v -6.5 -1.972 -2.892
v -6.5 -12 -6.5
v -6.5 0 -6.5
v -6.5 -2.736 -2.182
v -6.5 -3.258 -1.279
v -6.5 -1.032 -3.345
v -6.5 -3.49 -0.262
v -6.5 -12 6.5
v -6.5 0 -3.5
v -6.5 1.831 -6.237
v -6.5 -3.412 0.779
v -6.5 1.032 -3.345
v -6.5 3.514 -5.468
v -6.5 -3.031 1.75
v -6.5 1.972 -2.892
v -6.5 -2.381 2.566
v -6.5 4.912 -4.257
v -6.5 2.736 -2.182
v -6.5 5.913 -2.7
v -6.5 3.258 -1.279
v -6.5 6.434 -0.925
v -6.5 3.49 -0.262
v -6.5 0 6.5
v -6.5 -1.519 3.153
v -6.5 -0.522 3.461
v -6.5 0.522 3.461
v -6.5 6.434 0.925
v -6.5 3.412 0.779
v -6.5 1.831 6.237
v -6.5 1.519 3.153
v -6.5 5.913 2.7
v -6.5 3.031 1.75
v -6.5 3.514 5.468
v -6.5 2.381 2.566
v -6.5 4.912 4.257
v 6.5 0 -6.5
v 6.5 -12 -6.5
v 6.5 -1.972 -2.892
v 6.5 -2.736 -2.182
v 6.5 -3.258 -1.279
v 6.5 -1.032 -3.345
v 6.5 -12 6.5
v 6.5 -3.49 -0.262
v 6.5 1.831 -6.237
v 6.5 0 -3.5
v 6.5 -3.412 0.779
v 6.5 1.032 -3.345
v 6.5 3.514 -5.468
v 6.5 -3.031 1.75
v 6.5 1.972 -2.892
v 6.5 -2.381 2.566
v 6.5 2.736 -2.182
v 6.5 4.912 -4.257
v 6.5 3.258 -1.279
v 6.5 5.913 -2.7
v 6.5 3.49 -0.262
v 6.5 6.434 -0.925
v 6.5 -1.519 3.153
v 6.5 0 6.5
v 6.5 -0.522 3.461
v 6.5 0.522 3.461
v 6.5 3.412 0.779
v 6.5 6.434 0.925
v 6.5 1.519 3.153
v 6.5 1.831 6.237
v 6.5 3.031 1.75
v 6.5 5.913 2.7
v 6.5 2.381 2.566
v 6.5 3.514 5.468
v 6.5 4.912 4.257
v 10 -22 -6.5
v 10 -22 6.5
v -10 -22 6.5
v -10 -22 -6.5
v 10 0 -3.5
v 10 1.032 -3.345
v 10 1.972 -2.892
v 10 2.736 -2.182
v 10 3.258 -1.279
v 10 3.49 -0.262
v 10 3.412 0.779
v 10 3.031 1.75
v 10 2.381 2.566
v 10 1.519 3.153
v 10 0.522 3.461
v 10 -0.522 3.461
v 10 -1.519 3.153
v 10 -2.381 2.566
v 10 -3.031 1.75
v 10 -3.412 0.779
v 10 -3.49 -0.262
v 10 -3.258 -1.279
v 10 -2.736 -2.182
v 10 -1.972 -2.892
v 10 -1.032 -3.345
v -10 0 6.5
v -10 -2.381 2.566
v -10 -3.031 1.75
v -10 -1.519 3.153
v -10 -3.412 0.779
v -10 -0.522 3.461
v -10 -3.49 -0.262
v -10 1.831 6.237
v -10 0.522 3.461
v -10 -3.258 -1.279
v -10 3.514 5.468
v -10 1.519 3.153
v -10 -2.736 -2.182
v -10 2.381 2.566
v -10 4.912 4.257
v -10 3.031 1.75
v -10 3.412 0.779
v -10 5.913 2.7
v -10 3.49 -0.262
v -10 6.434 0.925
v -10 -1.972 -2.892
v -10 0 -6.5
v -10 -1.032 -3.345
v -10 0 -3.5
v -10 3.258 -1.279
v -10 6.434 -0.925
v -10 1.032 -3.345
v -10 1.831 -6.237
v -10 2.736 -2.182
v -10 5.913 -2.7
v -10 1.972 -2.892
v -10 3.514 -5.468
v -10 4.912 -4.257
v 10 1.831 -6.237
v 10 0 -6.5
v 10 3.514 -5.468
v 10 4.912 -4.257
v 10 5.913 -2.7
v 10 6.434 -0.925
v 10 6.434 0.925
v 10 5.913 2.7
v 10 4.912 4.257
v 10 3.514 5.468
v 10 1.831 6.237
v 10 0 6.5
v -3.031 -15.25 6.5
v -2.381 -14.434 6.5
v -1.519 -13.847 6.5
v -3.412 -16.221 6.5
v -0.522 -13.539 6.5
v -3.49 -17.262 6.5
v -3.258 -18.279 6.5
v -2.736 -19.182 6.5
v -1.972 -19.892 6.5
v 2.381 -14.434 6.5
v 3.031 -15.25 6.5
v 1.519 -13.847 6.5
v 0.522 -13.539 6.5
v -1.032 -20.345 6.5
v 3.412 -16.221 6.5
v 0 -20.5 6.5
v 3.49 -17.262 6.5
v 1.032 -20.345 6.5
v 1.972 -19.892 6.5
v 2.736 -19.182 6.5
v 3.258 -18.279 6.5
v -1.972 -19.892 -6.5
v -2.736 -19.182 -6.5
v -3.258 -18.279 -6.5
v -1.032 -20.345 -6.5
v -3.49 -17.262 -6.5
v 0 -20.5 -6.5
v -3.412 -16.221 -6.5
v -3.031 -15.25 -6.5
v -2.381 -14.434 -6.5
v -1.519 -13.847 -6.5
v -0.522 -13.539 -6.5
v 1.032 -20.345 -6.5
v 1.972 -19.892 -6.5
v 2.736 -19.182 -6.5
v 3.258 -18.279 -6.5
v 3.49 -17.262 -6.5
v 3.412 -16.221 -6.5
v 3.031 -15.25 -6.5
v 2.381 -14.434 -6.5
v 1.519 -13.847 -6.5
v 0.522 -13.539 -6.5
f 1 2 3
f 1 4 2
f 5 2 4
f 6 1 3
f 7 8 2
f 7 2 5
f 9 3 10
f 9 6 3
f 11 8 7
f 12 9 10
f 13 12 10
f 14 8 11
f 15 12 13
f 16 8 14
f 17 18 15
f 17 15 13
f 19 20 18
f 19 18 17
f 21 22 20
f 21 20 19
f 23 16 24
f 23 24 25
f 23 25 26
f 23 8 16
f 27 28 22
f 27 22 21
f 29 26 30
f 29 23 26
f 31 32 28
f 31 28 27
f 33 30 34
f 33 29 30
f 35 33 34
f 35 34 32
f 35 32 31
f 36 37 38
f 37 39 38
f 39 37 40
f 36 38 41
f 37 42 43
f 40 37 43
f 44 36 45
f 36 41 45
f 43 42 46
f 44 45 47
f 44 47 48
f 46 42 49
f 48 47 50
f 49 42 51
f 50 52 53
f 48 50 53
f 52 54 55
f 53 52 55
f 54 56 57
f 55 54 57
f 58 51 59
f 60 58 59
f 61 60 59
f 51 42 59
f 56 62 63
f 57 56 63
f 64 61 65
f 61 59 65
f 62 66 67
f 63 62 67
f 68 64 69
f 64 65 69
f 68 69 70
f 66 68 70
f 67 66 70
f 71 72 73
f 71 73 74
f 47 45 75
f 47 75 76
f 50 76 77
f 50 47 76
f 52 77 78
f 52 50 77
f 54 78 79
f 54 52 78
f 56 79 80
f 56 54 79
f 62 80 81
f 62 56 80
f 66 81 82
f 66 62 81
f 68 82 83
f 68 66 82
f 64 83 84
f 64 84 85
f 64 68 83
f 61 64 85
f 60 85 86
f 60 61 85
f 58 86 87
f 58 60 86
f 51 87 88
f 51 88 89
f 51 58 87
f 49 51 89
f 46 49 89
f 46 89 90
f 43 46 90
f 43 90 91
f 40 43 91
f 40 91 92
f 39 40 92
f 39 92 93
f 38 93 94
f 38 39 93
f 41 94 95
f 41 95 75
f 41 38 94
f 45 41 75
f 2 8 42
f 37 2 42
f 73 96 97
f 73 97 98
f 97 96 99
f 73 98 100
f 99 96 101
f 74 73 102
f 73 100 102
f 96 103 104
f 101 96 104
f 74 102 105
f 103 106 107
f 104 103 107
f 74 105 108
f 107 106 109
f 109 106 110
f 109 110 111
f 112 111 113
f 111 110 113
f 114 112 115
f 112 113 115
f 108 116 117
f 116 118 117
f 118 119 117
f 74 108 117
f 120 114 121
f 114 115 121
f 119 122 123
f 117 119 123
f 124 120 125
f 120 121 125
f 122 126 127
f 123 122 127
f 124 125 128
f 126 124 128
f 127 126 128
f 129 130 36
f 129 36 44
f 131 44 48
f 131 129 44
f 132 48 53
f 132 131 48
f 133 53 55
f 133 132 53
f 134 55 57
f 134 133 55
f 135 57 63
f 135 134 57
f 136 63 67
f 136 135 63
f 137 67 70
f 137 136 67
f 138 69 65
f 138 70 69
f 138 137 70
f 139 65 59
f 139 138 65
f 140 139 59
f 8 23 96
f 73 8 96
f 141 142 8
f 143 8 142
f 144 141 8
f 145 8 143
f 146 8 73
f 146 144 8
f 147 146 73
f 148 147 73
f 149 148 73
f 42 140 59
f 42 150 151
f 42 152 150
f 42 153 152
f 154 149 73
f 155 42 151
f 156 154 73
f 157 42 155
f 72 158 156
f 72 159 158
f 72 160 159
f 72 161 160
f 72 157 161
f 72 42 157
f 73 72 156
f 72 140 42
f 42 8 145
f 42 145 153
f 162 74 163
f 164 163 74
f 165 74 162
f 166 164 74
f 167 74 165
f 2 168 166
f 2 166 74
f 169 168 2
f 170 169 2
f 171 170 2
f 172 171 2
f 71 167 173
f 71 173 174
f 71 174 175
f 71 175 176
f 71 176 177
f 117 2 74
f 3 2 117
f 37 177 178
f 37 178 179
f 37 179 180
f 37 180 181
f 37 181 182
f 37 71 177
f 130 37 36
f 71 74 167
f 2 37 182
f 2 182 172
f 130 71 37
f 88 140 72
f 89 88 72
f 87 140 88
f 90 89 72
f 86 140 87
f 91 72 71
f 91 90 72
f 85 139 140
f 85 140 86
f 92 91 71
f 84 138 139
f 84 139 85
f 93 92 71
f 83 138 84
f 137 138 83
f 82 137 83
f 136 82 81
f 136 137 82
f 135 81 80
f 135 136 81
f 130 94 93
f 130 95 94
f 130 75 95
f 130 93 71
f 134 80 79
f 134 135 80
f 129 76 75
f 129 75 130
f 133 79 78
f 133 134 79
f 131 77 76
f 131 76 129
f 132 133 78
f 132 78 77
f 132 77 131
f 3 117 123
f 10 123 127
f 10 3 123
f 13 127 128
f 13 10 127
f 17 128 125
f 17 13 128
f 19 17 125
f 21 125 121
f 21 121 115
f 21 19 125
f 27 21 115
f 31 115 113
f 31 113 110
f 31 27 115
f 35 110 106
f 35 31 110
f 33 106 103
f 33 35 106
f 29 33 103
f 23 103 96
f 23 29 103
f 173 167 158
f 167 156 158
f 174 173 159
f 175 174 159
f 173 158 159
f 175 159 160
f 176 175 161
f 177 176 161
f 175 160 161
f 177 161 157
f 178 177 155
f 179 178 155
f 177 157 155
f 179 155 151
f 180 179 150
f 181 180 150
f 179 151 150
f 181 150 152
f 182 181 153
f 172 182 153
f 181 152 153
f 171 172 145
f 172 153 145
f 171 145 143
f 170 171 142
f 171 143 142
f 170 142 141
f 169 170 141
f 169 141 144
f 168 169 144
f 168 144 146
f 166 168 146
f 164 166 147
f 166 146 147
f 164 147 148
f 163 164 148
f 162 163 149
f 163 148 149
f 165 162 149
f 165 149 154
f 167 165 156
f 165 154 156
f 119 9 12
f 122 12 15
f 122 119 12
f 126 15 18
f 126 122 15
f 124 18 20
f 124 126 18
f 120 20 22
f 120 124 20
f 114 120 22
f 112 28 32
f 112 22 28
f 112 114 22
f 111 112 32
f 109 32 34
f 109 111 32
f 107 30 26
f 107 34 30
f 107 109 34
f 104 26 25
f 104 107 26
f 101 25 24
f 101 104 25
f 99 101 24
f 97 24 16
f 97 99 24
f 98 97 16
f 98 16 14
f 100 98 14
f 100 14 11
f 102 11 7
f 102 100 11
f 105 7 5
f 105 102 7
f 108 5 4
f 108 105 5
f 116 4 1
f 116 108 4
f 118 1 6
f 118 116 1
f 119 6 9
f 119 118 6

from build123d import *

# Parameters (mm, degrees)
ESBO_O1_R                = 3.5
RESSALTO_EXTRUS_O1_DEPTH = 10
ESBO_O2_R                = 3.5
CORTE_EXTRUS_O1_DEPTH    = 10
ESBO_O3_W                = 13
ESBO_O3_H                = 18.5
CORTE_EXTRUS_O2_DEPTH    = 10


with BuildPart() as part:
    # Esboço1 → Ressalto-extrusão1 (new, symmetric)
    with BuildSketch(Plane(origin=(0, 0, 0), x_dir=(0, 0, -1), z_dir=(1, 0, 0))):
        with BuildLine():
            Line((-6.5, 0), (-6.5, -22))
            Line((-6.5, -22), (6.5, -22))
            Line((6.5, -22), (6.5, 0))
            ThreePointArc((6.5, 0), (0, 6.5), (-6.5, 0))
        make_face()
        Circle(ESBO_O1_R, mode=Mode.SUBTRACT)
    extrude(amount=RESSALTO_EXTRUS_O1_DEPTH, both=True)

    # Esboço2 → Corte-extrusão1 (cut, symmetric)
    with BuildSketch(Plane.XY):
        with Locations(Location((0, -17, 0), (0, 0, 270))):
            Circle(ESBO_O2_R)
    extrude(amount=CORTE_EXTRUS_O1_DEPTH, both=True, mode=Mode.SUBTRACT)

    # Esboço3 → Corte-extrusão2 (cut, symmetric)
    with BuildSketch(Plane.XY):
        with Locations((0, -2.75)):
            Rectangle(ESBO_O3_W, ESBO_O3_H)
    extrude(amount=CORTE_EXTRUS_O2_DEPTH, both=True, mode=Mode.SUBTRACT)


solid = part.part
